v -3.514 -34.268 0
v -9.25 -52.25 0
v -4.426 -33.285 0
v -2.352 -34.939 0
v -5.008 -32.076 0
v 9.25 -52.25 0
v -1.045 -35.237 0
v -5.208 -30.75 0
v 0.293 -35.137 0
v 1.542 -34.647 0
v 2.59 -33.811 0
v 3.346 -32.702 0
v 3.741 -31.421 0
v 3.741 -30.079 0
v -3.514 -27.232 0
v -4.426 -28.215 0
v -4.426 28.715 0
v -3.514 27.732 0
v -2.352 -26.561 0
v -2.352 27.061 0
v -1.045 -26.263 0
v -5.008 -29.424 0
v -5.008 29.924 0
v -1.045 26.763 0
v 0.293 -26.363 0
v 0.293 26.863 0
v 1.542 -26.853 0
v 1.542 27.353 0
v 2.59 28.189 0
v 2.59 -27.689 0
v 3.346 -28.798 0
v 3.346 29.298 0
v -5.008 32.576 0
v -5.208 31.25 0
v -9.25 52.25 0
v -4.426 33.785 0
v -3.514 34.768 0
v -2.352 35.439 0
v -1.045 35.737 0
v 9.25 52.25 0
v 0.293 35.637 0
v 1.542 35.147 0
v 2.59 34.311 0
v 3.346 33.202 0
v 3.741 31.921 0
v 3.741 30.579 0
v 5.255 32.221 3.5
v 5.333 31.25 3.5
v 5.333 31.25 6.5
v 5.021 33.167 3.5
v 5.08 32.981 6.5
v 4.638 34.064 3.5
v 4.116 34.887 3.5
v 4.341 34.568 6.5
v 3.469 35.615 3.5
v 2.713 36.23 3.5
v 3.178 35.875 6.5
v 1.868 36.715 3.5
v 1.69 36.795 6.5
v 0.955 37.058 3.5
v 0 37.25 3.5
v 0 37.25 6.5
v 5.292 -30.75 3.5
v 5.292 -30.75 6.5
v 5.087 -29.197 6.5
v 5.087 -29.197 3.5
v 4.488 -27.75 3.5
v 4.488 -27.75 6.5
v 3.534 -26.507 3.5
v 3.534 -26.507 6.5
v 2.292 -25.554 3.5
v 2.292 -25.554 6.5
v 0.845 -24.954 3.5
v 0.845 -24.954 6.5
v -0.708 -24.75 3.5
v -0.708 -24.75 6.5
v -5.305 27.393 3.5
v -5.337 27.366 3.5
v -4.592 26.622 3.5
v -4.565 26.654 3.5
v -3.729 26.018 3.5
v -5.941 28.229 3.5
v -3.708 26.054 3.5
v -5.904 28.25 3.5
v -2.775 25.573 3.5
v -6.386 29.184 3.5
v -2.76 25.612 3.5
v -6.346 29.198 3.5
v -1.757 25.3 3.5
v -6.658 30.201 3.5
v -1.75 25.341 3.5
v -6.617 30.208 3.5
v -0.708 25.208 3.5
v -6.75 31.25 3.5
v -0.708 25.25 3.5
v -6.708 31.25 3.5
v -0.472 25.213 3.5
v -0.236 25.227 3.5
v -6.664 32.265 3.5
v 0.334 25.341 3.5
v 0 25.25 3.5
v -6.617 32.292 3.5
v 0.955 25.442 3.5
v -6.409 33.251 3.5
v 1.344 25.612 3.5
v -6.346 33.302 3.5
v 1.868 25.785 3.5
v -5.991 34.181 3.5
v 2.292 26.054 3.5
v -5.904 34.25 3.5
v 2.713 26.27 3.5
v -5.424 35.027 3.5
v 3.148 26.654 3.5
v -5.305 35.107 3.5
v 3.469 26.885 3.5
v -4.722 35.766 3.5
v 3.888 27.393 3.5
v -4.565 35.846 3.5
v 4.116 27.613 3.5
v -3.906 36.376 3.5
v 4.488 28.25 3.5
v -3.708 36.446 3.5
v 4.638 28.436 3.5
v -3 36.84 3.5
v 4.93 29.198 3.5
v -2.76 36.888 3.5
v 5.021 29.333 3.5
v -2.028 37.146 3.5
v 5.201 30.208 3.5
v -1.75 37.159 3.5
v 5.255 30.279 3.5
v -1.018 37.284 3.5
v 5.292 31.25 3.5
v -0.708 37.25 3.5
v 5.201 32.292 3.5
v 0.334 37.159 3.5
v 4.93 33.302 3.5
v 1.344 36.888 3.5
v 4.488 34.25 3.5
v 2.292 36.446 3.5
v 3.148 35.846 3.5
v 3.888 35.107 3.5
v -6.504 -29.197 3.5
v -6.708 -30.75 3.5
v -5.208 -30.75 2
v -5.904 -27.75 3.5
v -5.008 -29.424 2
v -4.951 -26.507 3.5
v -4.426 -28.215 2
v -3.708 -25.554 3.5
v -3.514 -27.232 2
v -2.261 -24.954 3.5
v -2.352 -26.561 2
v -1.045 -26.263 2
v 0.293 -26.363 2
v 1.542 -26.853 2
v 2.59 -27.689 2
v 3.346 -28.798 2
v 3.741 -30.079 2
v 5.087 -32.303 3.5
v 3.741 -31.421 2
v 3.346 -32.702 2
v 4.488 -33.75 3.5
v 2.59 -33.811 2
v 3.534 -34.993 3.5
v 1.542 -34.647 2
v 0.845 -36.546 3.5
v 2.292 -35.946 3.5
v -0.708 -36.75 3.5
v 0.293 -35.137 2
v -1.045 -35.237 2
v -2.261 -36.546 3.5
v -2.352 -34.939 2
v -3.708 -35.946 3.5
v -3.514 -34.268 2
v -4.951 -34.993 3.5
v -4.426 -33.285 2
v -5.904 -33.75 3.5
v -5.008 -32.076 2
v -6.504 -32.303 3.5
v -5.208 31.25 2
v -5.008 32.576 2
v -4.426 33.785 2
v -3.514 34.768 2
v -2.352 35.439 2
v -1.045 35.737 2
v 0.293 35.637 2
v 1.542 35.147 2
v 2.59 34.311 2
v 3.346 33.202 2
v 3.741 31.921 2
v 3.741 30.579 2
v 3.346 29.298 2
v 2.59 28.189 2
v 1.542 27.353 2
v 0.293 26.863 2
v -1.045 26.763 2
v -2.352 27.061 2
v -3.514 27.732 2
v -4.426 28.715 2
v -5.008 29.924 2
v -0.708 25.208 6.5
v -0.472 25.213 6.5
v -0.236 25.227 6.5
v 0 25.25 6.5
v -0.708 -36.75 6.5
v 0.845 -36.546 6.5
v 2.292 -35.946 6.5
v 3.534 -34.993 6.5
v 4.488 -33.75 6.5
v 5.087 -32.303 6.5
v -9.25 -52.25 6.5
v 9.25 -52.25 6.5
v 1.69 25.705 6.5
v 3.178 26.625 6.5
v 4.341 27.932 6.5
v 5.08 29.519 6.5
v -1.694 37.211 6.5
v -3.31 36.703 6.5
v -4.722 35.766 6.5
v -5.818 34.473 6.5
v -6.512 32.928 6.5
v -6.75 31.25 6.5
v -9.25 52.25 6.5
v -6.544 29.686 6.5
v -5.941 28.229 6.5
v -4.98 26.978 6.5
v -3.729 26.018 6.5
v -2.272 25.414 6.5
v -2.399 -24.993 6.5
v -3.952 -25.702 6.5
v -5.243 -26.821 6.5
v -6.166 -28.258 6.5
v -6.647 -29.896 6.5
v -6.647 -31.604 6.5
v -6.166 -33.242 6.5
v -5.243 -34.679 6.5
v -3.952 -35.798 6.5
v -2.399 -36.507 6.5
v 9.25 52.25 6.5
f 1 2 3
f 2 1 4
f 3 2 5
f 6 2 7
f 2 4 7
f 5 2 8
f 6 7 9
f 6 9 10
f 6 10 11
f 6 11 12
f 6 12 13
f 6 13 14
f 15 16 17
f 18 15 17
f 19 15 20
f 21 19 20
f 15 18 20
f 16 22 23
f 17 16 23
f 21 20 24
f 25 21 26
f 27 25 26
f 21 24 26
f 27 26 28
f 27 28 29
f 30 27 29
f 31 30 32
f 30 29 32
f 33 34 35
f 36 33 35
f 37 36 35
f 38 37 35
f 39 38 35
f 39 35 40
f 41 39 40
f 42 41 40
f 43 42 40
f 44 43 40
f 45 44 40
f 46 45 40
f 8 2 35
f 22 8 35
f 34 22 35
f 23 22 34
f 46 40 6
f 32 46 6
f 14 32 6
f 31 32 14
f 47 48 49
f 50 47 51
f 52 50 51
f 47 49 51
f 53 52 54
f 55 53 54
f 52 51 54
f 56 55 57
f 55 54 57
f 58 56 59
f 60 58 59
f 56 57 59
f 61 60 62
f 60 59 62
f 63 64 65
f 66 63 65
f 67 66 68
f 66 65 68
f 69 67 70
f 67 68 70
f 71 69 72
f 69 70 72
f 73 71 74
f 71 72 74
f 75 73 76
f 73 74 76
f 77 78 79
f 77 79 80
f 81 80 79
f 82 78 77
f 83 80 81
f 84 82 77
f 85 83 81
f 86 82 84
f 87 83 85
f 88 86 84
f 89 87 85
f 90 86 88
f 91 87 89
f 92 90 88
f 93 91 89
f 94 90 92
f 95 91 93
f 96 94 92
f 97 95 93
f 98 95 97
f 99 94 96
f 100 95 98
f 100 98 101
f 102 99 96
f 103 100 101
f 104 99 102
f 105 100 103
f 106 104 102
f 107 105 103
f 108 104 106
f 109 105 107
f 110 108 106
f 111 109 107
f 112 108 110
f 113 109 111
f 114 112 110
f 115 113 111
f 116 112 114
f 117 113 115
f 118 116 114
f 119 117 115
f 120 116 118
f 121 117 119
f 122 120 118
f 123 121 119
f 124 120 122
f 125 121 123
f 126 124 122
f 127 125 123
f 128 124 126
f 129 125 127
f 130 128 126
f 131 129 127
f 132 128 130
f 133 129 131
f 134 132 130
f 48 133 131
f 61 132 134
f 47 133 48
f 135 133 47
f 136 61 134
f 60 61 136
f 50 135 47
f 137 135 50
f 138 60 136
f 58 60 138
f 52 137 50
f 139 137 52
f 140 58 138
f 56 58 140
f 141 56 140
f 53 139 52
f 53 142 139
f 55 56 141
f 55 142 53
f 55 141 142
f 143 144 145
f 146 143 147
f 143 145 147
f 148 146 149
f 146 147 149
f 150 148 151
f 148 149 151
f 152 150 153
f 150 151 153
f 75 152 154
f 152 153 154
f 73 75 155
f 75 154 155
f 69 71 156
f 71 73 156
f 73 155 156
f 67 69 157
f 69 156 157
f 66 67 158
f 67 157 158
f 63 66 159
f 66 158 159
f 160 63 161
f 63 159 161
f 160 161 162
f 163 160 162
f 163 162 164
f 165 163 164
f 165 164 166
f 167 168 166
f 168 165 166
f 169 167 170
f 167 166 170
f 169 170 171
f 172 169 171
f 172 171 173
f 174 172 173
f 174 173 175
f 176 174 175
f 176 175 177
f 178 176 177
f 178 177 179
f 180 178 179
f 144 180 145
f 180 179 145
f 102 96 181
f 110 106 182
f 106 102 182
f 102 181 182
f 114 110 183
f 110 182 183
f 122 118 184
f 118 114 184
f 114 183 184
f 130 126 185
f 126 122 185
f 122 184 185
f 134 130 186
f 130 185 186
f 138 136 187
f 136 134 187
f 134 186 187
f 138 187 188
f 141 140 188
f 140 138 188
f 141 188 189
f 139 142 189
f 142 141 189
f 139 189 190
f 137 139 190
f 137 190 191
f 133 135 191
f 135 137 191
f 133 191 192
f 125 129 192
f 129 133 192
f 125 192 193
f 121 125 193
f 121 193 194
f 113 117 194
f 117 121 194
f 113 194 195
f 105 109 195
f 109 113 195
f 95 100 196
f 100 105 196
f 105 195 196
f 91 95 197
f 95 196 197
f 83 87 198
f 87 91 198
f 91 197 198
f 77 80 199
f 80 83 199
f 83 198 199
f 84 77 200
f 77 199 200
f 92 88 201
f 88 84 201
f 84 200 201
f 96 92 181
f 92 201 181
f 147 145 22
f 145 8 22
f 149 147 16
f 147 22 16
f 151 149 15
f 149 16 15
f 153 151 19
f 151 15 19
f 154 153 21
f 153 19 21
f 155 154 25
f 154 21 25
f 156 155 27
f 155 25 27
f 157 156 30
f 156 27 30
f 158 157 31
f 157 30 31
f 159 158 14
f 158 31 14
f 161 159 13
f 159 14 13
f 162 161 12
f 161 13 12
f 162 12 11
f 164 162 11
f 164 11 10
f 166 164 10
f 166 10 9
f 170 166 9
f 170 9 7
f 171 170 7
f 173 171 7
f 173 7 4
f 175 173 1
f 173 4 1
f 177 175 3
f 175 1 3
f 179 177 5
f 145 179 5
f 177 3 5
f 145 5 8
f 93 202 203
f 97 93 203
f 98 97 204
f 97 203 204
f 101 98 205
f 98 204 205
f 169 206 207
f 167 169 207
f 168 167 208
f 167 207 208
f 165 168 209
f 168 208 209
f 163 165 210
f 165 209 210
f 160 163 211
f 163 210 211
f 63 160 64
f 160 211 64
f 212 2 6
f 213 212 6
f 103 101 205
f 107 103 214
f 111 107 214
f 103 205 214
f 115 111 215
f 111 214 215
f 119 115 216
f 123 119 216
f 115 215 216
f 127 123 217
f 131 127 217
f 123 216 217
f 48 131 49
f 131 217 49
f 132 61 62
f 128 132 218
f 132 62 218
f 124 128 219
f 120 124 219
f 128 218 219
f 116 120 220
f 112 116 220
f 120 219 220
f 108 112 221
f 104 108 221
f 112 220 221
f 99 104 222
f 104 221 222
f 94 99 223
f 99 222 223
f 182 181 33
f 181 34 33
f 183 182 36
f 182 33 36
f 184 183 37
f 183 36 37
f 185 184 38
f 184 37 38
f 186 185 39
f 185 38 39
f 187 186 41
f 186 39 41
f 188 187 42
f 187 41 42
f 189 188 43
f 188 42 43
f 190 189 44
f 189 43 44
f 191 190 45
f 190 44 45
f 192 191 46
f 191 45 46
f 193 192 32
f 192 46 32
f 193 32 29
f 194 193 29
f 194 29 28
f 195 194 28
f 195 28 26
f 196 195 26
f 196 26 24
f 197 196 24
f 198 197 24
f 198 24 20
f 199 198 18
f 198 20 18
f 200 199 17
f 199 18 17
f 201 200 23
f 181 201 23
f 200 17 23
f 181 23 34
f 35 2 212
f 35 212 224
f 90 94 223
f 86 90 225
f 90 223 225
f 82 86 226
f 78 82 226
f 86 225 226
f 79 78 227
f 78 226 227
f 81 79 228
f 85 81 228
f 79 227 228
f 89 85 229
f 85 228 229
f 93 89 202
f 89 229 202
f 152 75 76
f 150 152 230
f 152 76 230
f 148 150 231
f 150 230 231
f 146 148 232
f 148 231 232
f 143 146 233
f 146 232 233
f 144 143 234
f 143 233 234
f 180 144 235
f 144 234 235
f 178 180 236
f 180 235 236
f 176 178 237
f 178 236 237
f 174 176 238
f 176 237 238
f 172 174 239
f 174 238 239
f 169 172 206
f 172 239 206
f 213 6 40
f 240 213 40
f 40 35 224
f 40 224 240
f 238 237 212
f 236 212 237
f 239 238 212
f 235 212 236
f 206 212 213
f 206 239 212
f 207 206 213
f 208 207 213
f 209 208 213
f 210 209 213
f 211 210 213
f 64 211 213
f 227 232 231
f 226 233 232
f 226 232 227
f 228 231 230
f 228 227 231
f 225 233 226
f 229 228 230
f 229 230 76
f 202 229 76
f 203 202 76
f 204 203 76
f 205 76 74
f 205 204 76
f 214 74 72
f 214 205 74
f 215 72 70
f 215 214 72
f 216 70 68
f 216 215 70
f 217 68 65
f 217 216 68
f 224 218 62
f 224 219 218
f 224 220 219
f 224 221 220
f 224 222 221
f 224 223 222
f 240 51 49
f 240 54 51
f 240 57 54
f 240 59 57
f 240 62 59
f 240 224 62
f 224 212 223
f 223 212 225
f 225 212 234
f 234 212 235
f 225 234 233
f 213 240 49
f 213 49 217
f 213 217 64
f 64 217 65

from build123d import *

# Parameters (mm, degrees)
F0_W           = 18.5
F0_H           = 104.5
F1_DEPTH       = 6.5
F3_DEPTH       = 3
F5_D           = 9
F5_CSINK_D     = 12
F5_CSINK_ANGLE = 90
F7_D           = 9
F7_CSINK_D     = 12
F7_CSINK_ANGLE = 90


with BuildPart() as f1:
    # F0 (on Top) → F1 (new body)
    with BuildSketch(Plane.XY):
        Rectangle(F0_W, F0_H)
    extrude(amount=F1_DEPTH)

    # F2 (on face) → F3 (cut)
    with BuildSketch(Plane.XY.offset(6.5)):
        with BuildLine():
            ThreePointArc((5.3333333333, 31.25), (3.8072646337, 35.2638648596), (0, 37.25))
            Line((0, 37.25), (0, 31.25))
            Line((0, 31.25), (5.3333333333, 31.25))
        make_face()
        with BuildLine():
            Line((0, 31.25), (0, 37.25))
            ThreePointArc((0, 37.25), (-4.7221981929, 35.765597967), (-6.75, 31.25))
            Line((-6.75, 31.25), (-0.7083333333, 31.25))
            Line((-0.7083333333, 31.25), (0, 31.25))
        make_face()
        with BuildLine():
            Line((5.3333333333, 31.25), (0, 31.25))
            Line((0, 31.25), (0, 25.25))
            ThreePointArc((0, 25.25), (3.8072646337, 27.2361351404), (5.3333333333, 31.25))
        make_face()
        with BuildLine():
            Line((0, 25.25), (0, 31.25))
            Line((0, 31.25), (-0.7083333333, 31.25))
            Line((-0.7083333333, 31.25), (-0.7083333333, 25.2083333333))
            ThreePointArc((-0.7083333333, 25.2083333333), (-0.3535544507, 25.2187589954), (0, 25.25))
        make_face()
        with BuildLine():
            Line((-0.7083333333, 31.25), (-6.75, 31.25))
            ThreePointArc((-6.75, 31.25), (-4.980436803, 26.9778965303), (-0.7083333333, 25.2083333333))
            Line((-0.7083333333, 25.2083333333), (-0.7083333333, 31.25))
        make_face()
        with BuildLine():
            ThreePointArc((5.2916666667, -30.75), (3.5343073538, -26.5073593129), (-0.7083333333, -24.75))
            Line((-0.7083333333, -24.75), (-0.7083333333, -36.75))
            ThreePointArc((-0.7083333333, -36.75), (3.5343073538, -34.9926406871), (5.2916666667, -30.75))
        make_face()
        with BuildLine():
            Line((-0.7083333333, -36.75), (-0.7083333333, -24.75))
            ThreePointArc((-0.7083333333, -24.75), (-6.7083333333, -30.75), (-0.7083333333, -36.75))
        make_face()
    extrude(amount=-F3_DEPTH, mode=Mode.SUBTRACT)

    # F5 (through all)
    with Locations(Plane.XY.offset(3.5)):
        with Locations((-0.7083333333, 31.25)):
            CounterSinkHole(F5_D / 2, F5_CSINK_D / 2, counter_sink_angle=F5_CSINK_ANGLE)

    # F7 (through all)
    with Locations(Plane.XY.offset(3.5)):
        with Locations((-0.7083333333, -30.75)):
            CounterSinkHole(F7_D / 2, F7_CSINK_D / 2, counter_sink_angle=F7_CSINK_ANGLE)


solid = f1.part
